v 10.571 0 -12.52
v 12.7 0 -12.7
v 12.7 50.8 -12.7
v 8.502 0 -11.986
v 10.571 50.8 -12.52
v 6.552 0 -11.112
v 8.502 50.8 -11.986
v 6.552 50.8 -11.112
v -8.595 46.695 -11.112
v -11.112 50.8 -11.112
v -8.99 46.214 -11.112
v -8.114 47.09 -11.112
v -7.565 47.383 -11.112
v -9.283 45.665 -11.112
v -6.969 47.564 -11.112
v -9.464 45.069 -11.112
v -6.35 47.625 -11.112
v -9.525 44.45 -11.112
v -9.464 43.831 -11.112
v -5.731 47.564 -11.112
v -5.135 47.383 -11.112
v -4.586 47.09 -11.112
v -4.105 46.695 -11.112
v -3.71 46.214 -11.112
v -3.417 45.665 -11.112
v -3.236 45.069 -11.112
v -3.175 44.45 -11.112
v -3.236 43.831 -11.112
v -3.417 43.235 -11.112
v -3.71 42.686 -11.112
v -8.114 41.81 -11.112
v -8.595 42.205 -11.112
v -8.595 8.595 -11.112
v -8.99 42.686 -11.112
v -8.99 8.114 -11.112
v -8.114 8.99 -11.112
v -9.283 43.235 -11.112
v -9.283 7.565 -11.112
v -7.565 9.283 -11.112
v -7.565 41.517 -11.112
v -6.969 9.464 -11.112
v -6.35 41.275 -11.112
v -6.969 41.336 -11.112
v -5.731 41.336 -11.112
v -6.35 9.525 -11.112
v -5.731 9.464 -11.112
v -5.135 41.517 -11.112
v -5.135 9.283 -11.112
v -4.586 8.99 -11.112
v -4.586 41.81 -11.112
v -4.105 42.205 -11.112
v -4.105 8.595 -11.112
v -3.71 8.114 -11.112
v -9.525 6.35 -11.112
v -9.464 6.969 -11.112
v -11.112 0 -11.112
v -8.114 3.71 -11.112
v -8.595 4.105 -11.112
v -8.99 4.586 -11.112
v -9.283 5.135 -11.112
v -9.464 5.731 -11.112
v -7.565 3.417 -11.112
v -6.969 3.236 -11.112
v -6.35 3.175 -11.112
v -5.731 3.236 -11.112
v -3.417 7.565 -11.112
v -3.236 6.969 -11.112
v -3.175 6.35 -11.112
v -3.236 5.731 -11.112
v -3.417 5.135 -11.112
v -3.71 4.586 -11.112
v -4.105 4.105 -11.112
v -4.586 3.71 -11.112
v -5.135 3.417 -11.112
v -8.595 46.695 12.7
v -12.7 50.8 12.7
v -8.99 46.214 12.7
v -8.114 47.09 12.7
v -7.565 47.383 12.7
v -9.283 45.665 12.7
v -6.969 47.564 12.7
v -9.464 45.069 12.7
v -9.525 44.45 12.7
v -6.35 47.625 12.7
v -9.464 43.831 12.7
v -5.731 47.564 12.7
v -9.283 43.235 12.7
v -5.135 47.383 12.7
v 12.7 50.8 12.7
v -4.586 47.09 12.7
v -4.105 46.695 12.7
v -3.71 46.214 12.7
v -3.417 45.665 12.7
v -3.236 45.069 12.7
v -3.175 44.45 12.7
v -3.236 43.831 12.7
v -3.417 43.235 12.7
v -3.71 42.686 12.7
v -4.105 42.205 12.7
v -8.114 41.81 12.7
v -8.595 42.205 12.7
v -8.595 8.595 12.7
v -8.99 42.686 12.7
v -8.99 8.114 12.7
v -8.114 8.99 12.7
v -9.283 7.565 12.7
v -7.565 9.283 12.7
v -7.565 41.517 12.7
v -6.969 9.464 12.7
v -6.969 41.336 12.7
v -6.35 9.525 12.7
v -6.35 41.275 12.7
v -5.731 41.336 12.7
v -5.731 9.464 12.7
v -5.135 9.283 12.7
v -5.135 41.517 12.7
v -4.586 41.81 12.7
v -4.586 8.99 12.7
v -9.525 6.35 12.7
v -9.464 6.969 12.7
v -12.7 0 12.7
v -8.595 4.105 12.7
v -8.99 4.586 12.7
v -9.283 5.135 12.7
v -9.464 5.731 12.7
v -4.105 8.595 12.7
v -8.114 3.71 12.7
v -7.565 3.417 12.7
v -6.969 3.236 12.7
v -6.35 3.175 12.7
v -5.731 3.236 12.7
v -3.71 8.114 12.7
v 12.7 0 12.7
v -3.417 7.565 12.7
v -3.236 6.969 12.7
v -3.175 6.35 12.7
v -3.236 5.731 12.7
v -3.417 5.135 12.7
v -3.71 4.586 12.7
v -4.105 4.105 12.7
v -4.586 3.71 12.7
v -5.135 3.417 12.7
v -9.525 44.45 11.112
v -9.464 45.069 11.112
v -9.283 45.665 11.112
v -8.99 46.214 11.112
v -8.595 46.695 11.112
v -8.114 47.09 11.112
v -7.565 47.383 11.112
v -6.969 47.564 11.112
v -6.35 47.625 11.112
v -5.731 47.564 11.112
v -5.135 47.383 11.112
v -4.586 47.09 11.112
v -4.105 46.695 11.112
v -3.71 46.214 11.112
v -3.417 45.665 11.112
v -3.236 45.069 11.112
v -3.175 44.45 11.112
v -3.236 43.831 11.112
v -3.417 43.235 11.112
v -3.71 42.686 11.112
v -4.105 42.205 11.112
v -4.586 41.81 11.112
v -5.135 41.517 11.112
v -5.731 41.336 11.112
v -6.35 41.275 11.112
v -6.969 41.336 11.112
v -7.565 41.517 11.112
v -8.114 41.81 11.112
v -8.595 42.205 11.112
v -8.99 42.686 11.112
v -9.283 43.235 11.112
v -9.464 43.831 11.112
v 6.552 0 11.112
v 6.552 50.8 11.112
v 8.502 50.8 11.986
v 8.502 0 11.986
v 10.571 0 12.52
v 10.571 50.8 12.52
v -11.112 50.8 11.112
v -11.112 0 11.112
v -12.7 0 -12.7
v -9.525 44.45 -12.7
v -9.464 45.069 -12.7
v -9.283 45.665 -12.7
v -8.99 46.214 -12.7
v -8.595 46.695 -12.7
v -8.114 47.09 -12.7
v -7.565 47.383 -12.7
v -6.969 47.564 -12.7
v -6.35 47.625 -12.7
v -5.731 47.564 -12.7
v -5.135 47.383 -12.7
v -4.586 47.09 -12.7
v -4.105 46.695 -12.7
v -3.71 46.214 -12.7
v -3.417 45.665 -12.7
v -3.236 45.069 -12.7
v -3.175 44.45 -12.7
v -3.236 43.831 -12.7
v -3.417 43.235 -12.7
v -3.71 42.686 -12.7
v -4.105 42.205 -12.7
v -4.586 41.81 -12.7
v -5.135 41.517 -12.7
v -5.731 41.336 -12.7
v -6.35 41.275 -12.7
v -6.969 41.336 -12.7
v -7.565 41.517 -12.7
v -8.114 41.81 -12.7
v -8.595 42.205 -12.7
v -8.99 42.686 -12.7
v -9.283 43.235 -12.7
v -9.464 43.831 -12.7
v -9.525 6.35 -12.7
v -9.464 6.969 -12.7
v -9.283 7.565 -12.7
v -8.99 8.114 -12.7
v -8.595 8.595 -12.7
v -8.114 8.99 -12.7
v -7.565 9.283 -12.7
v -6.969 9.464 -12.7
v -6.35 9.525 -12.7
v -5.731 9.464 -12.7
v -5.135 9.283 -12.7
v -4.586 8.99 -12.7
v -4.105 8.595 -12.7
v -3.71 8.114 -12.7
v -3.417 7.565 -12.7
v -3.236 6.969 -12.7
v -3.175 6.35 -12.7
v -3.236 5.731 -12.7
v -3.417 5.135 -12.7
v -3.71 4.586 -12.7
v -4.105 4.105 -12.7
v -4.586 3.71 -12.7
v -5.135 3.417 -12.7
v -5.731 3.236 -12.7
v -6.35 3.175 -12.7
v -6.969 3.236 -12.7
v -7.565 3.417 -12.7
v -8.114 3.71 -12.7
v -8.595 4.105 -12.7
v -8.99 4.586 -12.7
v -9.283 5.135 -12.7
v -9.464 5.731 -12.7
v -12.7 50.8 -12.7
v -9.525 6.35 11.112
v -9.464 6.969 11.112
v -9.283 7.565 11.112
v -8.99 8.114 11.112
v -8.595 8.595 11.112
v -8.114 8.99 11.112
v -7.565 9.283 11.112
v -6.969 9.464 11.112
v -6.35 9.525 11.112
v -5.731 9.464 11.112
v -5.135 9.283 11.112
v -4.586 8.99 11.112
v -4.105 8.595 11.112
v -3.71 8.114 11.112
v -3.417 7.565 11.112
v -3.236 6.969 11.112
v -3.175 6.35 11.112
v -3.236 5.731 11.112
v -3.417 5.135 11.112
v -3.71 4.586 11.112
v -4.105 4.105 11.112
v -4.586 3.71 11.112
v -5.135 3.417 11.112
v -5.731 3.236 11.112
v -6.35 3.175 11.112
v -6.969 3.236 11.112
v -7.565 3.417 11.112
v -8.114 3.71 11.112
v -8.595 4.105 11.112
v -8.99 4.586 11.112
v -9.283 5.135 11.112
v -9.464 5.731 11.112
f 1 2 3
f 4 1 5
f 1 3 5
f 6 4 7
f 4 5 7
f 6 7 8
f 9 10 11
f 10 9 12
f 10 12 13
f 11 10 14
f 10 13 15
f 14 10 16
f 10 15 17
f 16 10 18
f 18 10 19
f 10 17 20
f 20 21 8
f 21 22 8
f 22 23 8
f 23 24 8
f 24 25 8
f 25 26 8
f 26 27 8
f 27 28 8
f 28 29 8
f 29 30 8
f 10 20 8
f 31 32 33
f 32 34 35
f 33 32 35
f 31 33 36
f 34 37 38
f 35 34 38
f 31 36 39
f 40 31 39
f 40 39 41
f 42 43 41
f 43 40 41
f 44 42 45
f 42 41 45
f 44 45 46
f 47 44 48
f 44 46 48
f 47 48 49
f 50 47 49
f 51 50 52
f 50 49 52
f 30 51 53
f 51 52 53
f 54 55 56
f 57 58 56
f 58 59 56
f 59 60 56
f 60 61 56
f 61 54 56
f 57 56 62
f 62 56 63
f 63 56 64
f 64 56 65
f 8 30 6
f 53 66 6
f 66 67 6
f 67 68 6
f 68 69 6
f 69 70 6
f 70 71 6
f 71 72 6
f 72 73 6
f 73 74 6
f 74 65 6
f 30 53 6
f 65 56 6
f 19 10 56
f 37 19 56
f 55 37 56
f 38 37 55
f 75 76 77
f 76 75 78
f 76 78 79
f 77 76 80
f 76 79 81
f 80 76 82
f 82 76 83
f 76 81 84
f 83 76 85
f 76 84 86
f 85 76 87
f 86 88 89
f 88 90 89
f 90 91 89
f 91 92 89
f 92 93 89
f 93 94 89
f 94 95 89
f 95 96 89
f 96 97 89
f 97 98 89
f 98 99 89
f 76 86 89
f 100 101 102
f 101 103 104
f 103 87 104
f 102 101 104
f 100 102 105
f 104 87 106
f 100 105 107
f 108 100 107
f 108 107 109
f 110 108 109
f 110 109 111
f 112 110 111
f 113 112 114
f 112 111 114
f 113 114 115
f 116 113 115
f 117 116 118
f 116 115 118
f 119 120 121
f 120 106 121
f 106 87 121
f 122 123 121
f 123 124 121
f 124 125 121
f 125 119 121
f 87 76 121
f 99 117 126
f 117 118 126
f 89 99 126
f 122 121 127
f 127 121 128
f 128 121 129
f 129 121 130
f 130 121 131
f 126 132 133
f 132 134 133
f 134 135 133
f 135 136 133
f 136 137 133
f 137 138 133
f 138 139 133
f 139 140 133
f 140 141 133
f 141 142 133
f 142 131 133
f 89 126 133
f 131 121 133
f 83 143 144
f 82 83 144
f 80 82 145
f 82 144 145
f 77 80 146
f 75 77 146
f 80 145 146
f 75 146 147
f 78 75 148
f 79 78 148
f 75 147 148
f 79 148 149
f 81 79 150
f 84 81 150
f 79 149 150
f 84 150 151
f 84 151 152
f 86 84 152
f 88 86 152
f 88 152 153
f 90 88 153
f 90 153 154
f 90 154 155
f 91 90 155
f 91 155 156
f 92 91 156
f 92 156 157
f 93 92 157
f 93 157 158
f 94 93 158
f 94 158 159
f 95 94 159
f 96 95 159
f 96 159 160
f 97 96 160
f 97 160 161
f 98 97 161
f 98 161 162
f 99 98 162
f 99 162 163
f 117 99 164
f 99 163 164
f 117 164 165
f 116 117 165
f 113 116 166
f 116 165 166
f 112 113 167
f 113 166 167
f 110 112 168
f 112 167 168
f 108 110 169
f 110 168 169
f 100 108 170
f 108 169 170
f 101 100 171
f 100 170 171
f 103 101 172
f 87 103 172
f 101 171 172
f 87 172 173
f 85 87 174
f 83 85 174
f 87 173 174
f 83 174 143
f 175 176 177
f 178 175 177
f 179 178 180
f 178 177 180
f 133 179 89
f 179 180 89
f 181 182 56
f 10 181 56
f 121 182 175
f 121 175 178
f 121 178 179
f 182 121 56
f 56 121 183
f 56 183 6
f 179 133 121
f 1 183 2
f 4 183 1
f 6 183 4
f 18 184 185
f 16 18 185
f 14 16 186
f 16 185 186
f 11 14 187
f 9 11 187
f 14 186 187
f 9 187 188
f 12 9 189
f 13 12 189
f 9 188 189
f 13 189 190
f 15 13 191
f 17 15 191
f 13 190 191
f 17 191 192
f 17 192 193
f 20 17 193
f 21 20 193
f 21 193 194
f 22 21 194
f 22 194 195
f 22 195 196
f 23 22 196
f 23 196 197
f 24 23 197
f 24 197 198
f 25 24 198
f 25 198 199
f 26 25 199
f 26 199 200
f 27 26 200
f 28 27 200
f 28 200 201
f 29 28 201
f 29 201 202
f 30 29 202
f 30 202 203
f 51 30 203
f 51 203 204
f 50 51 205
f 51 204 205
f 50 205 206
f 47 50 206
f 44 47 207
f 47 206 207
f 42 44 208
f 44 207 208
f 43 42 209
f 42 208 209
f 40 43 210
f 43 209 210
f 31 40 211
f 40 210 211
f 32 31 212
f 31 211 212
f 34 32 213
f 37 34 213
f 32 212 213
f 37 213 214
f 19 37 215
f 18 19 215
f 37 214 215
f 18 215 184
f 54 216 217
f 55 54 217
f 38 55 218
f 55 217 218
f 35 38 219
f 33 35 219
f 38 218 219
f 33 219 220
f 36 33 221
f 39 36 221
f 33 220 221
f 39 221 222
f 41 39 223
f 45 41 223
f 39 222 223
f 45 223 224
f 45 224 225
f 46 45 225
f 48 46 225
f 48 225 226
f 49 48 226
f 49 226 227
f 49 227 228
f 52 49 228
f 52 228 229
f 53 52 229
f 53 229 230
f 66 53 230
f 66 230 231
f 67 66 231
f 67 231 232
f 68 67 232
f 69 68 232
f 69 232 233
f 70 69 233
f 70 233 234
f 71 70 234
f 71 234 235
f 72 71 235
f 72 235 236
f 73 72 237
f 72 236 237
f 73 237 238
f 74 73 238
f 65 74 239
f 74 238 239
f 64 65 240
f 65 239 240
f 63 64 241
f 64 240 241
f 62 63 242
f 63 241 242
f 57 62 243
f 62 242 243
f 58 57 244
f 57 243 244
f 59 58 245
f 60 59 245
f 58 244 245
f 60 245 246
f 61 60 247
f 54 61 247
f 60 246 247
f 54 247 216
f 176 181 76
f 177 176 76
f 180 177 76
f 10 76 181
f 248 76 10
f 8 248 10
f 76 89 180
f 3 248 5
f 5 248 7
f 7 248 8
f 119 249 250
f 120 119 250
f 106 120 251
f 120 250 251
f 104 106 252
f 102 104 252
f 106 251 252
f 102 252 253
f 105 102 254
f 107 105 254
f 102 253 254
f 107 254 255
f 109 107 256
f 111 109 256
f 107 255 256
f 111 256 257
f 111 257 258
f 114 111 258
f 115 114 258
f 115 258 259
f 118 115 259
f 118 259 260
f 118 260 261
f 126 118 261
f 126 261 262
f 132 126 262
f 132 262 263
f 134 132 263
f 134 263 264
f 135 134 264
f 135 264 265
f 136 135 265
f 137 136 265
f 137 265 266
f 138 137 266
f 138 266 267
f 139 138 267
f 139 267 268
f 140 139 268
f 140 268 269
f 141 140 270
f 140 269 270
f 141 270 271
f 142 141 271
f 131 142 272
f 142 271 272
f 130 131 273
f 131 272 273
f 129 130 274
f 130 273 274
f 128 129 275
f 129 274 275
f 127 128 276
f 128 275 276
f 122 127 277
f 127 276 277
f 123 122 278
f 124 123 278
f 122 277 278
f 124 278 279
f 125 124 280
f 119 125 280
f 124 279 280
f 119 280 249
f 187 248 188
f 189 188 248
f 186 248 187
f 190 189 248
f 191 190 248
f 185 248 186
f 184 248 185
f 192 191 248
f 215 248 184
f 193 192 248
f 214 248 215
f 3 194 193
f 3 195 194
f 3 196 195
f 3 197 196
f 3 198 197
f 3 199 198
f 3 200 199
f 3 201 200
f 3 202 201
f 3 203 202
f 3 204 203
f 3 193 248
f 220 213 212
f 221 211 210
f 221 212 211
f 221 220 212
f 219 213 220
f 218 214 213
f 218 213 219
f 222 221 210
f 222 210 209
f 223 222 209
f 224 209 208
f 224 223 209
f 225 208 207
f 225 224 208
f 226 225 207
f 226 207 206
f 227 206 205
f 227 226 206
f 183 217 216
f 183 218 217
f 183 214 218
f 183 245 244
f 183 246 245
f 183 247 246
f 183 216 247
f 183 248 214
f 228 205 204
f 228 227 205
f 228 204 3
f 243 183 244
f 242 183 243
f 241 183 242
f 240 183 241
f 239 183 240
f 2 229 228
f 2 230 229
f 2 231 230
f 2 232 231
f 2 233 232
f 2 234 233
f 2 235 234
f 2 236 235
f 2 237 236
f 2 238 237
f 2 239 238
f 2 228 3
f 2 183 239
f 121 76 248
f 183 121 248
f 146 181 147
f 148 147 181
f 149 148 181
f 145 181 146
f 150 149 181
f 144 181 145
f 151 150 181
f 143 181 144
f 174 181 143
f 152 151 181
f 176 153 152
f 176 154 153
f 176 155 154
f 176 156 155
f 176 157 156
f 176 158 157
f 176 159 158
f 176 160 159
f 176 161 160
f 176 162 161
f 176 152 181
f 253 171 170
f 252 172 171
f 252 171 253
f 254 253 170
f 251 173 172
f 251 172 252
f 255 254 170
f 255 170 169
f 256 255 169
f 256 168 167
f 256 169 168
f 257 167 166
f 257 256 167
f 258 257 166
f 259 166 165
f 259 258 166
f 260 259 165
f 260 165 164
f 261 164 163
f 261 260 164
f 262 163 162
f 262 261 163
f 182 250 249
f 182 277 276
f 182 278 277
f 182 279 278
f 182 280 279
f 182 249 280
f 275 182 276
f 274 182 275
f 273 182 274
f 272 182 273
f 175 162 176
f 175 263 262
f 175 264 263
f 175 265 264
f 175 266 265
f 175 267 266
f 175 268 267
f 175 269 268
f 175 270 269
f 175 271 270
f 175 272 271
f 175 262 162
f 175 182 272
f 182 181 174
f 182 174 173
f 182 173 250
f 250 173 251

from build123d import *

# Parameters (mm, degrees)
SKETCH1_W           = 25.4
SKETCH1_H           = 25.4
SKETCH1_W_2         = 22.225
SKETCH1_H_2         = 22.225
BOSS_EXTRUDE1_DEPTH = 50.8
SKETCH2_R           = 12.7
CUT_EXTRUDE1_DEPTH  = 54.881536726
SKETCH3_R           = 3.175
CUT_EXTRUDE2_DEPTH  = 59.198711326


with BuildPart() as part:
    # Sketch1 → Boss-Extrude1 (new body)
    with BuildSketch(Plane(origin=(0, 0, 0), x_dir=(1, 0, 0), z_dir=(0, 1, 0))):
        Rectangle(SKETCH1_W, SKETCH1_H)
        Rectangle(SKETCH1_W_2, SKETCH1_H_2, mode=Mode.SUBTRACT)
    extrude(amount=BOSS_EXTRUDE1_DEPTH)

    # Sketch2 → Cut-Extrude1 (cut, through all)
    with BuildSketch(Plane(origin=(0, 50.8, 0), x_dir=(1, 0, 0), z_dir=(0, 1, 0))):
        with Locations((12.7, 0)):
            Circle(SKETCH2_R)
    extrude(amount=-CUT_EXTRUDE1_DEPTH, mode=Mode.SUBTRACT)

    # Sketch3 → Cut-Extrude2 (cut, through all)
    with BuildSketch(Plane(origin=(0, 0, -12.7), x_dir=(-1, 0, 0), z_dir=(0, 0, -1))):
        with Locations((6.35, 44.45)):
            Circle(SKETCH3_R)
        with Locations((6.35, 6.35)):
            Circle(SKETCH3_R)
    extrude(amount=-CUT_EXTRUDE2_DEPTH, mode=Mode.SUBTRACT)


solid = part.part
